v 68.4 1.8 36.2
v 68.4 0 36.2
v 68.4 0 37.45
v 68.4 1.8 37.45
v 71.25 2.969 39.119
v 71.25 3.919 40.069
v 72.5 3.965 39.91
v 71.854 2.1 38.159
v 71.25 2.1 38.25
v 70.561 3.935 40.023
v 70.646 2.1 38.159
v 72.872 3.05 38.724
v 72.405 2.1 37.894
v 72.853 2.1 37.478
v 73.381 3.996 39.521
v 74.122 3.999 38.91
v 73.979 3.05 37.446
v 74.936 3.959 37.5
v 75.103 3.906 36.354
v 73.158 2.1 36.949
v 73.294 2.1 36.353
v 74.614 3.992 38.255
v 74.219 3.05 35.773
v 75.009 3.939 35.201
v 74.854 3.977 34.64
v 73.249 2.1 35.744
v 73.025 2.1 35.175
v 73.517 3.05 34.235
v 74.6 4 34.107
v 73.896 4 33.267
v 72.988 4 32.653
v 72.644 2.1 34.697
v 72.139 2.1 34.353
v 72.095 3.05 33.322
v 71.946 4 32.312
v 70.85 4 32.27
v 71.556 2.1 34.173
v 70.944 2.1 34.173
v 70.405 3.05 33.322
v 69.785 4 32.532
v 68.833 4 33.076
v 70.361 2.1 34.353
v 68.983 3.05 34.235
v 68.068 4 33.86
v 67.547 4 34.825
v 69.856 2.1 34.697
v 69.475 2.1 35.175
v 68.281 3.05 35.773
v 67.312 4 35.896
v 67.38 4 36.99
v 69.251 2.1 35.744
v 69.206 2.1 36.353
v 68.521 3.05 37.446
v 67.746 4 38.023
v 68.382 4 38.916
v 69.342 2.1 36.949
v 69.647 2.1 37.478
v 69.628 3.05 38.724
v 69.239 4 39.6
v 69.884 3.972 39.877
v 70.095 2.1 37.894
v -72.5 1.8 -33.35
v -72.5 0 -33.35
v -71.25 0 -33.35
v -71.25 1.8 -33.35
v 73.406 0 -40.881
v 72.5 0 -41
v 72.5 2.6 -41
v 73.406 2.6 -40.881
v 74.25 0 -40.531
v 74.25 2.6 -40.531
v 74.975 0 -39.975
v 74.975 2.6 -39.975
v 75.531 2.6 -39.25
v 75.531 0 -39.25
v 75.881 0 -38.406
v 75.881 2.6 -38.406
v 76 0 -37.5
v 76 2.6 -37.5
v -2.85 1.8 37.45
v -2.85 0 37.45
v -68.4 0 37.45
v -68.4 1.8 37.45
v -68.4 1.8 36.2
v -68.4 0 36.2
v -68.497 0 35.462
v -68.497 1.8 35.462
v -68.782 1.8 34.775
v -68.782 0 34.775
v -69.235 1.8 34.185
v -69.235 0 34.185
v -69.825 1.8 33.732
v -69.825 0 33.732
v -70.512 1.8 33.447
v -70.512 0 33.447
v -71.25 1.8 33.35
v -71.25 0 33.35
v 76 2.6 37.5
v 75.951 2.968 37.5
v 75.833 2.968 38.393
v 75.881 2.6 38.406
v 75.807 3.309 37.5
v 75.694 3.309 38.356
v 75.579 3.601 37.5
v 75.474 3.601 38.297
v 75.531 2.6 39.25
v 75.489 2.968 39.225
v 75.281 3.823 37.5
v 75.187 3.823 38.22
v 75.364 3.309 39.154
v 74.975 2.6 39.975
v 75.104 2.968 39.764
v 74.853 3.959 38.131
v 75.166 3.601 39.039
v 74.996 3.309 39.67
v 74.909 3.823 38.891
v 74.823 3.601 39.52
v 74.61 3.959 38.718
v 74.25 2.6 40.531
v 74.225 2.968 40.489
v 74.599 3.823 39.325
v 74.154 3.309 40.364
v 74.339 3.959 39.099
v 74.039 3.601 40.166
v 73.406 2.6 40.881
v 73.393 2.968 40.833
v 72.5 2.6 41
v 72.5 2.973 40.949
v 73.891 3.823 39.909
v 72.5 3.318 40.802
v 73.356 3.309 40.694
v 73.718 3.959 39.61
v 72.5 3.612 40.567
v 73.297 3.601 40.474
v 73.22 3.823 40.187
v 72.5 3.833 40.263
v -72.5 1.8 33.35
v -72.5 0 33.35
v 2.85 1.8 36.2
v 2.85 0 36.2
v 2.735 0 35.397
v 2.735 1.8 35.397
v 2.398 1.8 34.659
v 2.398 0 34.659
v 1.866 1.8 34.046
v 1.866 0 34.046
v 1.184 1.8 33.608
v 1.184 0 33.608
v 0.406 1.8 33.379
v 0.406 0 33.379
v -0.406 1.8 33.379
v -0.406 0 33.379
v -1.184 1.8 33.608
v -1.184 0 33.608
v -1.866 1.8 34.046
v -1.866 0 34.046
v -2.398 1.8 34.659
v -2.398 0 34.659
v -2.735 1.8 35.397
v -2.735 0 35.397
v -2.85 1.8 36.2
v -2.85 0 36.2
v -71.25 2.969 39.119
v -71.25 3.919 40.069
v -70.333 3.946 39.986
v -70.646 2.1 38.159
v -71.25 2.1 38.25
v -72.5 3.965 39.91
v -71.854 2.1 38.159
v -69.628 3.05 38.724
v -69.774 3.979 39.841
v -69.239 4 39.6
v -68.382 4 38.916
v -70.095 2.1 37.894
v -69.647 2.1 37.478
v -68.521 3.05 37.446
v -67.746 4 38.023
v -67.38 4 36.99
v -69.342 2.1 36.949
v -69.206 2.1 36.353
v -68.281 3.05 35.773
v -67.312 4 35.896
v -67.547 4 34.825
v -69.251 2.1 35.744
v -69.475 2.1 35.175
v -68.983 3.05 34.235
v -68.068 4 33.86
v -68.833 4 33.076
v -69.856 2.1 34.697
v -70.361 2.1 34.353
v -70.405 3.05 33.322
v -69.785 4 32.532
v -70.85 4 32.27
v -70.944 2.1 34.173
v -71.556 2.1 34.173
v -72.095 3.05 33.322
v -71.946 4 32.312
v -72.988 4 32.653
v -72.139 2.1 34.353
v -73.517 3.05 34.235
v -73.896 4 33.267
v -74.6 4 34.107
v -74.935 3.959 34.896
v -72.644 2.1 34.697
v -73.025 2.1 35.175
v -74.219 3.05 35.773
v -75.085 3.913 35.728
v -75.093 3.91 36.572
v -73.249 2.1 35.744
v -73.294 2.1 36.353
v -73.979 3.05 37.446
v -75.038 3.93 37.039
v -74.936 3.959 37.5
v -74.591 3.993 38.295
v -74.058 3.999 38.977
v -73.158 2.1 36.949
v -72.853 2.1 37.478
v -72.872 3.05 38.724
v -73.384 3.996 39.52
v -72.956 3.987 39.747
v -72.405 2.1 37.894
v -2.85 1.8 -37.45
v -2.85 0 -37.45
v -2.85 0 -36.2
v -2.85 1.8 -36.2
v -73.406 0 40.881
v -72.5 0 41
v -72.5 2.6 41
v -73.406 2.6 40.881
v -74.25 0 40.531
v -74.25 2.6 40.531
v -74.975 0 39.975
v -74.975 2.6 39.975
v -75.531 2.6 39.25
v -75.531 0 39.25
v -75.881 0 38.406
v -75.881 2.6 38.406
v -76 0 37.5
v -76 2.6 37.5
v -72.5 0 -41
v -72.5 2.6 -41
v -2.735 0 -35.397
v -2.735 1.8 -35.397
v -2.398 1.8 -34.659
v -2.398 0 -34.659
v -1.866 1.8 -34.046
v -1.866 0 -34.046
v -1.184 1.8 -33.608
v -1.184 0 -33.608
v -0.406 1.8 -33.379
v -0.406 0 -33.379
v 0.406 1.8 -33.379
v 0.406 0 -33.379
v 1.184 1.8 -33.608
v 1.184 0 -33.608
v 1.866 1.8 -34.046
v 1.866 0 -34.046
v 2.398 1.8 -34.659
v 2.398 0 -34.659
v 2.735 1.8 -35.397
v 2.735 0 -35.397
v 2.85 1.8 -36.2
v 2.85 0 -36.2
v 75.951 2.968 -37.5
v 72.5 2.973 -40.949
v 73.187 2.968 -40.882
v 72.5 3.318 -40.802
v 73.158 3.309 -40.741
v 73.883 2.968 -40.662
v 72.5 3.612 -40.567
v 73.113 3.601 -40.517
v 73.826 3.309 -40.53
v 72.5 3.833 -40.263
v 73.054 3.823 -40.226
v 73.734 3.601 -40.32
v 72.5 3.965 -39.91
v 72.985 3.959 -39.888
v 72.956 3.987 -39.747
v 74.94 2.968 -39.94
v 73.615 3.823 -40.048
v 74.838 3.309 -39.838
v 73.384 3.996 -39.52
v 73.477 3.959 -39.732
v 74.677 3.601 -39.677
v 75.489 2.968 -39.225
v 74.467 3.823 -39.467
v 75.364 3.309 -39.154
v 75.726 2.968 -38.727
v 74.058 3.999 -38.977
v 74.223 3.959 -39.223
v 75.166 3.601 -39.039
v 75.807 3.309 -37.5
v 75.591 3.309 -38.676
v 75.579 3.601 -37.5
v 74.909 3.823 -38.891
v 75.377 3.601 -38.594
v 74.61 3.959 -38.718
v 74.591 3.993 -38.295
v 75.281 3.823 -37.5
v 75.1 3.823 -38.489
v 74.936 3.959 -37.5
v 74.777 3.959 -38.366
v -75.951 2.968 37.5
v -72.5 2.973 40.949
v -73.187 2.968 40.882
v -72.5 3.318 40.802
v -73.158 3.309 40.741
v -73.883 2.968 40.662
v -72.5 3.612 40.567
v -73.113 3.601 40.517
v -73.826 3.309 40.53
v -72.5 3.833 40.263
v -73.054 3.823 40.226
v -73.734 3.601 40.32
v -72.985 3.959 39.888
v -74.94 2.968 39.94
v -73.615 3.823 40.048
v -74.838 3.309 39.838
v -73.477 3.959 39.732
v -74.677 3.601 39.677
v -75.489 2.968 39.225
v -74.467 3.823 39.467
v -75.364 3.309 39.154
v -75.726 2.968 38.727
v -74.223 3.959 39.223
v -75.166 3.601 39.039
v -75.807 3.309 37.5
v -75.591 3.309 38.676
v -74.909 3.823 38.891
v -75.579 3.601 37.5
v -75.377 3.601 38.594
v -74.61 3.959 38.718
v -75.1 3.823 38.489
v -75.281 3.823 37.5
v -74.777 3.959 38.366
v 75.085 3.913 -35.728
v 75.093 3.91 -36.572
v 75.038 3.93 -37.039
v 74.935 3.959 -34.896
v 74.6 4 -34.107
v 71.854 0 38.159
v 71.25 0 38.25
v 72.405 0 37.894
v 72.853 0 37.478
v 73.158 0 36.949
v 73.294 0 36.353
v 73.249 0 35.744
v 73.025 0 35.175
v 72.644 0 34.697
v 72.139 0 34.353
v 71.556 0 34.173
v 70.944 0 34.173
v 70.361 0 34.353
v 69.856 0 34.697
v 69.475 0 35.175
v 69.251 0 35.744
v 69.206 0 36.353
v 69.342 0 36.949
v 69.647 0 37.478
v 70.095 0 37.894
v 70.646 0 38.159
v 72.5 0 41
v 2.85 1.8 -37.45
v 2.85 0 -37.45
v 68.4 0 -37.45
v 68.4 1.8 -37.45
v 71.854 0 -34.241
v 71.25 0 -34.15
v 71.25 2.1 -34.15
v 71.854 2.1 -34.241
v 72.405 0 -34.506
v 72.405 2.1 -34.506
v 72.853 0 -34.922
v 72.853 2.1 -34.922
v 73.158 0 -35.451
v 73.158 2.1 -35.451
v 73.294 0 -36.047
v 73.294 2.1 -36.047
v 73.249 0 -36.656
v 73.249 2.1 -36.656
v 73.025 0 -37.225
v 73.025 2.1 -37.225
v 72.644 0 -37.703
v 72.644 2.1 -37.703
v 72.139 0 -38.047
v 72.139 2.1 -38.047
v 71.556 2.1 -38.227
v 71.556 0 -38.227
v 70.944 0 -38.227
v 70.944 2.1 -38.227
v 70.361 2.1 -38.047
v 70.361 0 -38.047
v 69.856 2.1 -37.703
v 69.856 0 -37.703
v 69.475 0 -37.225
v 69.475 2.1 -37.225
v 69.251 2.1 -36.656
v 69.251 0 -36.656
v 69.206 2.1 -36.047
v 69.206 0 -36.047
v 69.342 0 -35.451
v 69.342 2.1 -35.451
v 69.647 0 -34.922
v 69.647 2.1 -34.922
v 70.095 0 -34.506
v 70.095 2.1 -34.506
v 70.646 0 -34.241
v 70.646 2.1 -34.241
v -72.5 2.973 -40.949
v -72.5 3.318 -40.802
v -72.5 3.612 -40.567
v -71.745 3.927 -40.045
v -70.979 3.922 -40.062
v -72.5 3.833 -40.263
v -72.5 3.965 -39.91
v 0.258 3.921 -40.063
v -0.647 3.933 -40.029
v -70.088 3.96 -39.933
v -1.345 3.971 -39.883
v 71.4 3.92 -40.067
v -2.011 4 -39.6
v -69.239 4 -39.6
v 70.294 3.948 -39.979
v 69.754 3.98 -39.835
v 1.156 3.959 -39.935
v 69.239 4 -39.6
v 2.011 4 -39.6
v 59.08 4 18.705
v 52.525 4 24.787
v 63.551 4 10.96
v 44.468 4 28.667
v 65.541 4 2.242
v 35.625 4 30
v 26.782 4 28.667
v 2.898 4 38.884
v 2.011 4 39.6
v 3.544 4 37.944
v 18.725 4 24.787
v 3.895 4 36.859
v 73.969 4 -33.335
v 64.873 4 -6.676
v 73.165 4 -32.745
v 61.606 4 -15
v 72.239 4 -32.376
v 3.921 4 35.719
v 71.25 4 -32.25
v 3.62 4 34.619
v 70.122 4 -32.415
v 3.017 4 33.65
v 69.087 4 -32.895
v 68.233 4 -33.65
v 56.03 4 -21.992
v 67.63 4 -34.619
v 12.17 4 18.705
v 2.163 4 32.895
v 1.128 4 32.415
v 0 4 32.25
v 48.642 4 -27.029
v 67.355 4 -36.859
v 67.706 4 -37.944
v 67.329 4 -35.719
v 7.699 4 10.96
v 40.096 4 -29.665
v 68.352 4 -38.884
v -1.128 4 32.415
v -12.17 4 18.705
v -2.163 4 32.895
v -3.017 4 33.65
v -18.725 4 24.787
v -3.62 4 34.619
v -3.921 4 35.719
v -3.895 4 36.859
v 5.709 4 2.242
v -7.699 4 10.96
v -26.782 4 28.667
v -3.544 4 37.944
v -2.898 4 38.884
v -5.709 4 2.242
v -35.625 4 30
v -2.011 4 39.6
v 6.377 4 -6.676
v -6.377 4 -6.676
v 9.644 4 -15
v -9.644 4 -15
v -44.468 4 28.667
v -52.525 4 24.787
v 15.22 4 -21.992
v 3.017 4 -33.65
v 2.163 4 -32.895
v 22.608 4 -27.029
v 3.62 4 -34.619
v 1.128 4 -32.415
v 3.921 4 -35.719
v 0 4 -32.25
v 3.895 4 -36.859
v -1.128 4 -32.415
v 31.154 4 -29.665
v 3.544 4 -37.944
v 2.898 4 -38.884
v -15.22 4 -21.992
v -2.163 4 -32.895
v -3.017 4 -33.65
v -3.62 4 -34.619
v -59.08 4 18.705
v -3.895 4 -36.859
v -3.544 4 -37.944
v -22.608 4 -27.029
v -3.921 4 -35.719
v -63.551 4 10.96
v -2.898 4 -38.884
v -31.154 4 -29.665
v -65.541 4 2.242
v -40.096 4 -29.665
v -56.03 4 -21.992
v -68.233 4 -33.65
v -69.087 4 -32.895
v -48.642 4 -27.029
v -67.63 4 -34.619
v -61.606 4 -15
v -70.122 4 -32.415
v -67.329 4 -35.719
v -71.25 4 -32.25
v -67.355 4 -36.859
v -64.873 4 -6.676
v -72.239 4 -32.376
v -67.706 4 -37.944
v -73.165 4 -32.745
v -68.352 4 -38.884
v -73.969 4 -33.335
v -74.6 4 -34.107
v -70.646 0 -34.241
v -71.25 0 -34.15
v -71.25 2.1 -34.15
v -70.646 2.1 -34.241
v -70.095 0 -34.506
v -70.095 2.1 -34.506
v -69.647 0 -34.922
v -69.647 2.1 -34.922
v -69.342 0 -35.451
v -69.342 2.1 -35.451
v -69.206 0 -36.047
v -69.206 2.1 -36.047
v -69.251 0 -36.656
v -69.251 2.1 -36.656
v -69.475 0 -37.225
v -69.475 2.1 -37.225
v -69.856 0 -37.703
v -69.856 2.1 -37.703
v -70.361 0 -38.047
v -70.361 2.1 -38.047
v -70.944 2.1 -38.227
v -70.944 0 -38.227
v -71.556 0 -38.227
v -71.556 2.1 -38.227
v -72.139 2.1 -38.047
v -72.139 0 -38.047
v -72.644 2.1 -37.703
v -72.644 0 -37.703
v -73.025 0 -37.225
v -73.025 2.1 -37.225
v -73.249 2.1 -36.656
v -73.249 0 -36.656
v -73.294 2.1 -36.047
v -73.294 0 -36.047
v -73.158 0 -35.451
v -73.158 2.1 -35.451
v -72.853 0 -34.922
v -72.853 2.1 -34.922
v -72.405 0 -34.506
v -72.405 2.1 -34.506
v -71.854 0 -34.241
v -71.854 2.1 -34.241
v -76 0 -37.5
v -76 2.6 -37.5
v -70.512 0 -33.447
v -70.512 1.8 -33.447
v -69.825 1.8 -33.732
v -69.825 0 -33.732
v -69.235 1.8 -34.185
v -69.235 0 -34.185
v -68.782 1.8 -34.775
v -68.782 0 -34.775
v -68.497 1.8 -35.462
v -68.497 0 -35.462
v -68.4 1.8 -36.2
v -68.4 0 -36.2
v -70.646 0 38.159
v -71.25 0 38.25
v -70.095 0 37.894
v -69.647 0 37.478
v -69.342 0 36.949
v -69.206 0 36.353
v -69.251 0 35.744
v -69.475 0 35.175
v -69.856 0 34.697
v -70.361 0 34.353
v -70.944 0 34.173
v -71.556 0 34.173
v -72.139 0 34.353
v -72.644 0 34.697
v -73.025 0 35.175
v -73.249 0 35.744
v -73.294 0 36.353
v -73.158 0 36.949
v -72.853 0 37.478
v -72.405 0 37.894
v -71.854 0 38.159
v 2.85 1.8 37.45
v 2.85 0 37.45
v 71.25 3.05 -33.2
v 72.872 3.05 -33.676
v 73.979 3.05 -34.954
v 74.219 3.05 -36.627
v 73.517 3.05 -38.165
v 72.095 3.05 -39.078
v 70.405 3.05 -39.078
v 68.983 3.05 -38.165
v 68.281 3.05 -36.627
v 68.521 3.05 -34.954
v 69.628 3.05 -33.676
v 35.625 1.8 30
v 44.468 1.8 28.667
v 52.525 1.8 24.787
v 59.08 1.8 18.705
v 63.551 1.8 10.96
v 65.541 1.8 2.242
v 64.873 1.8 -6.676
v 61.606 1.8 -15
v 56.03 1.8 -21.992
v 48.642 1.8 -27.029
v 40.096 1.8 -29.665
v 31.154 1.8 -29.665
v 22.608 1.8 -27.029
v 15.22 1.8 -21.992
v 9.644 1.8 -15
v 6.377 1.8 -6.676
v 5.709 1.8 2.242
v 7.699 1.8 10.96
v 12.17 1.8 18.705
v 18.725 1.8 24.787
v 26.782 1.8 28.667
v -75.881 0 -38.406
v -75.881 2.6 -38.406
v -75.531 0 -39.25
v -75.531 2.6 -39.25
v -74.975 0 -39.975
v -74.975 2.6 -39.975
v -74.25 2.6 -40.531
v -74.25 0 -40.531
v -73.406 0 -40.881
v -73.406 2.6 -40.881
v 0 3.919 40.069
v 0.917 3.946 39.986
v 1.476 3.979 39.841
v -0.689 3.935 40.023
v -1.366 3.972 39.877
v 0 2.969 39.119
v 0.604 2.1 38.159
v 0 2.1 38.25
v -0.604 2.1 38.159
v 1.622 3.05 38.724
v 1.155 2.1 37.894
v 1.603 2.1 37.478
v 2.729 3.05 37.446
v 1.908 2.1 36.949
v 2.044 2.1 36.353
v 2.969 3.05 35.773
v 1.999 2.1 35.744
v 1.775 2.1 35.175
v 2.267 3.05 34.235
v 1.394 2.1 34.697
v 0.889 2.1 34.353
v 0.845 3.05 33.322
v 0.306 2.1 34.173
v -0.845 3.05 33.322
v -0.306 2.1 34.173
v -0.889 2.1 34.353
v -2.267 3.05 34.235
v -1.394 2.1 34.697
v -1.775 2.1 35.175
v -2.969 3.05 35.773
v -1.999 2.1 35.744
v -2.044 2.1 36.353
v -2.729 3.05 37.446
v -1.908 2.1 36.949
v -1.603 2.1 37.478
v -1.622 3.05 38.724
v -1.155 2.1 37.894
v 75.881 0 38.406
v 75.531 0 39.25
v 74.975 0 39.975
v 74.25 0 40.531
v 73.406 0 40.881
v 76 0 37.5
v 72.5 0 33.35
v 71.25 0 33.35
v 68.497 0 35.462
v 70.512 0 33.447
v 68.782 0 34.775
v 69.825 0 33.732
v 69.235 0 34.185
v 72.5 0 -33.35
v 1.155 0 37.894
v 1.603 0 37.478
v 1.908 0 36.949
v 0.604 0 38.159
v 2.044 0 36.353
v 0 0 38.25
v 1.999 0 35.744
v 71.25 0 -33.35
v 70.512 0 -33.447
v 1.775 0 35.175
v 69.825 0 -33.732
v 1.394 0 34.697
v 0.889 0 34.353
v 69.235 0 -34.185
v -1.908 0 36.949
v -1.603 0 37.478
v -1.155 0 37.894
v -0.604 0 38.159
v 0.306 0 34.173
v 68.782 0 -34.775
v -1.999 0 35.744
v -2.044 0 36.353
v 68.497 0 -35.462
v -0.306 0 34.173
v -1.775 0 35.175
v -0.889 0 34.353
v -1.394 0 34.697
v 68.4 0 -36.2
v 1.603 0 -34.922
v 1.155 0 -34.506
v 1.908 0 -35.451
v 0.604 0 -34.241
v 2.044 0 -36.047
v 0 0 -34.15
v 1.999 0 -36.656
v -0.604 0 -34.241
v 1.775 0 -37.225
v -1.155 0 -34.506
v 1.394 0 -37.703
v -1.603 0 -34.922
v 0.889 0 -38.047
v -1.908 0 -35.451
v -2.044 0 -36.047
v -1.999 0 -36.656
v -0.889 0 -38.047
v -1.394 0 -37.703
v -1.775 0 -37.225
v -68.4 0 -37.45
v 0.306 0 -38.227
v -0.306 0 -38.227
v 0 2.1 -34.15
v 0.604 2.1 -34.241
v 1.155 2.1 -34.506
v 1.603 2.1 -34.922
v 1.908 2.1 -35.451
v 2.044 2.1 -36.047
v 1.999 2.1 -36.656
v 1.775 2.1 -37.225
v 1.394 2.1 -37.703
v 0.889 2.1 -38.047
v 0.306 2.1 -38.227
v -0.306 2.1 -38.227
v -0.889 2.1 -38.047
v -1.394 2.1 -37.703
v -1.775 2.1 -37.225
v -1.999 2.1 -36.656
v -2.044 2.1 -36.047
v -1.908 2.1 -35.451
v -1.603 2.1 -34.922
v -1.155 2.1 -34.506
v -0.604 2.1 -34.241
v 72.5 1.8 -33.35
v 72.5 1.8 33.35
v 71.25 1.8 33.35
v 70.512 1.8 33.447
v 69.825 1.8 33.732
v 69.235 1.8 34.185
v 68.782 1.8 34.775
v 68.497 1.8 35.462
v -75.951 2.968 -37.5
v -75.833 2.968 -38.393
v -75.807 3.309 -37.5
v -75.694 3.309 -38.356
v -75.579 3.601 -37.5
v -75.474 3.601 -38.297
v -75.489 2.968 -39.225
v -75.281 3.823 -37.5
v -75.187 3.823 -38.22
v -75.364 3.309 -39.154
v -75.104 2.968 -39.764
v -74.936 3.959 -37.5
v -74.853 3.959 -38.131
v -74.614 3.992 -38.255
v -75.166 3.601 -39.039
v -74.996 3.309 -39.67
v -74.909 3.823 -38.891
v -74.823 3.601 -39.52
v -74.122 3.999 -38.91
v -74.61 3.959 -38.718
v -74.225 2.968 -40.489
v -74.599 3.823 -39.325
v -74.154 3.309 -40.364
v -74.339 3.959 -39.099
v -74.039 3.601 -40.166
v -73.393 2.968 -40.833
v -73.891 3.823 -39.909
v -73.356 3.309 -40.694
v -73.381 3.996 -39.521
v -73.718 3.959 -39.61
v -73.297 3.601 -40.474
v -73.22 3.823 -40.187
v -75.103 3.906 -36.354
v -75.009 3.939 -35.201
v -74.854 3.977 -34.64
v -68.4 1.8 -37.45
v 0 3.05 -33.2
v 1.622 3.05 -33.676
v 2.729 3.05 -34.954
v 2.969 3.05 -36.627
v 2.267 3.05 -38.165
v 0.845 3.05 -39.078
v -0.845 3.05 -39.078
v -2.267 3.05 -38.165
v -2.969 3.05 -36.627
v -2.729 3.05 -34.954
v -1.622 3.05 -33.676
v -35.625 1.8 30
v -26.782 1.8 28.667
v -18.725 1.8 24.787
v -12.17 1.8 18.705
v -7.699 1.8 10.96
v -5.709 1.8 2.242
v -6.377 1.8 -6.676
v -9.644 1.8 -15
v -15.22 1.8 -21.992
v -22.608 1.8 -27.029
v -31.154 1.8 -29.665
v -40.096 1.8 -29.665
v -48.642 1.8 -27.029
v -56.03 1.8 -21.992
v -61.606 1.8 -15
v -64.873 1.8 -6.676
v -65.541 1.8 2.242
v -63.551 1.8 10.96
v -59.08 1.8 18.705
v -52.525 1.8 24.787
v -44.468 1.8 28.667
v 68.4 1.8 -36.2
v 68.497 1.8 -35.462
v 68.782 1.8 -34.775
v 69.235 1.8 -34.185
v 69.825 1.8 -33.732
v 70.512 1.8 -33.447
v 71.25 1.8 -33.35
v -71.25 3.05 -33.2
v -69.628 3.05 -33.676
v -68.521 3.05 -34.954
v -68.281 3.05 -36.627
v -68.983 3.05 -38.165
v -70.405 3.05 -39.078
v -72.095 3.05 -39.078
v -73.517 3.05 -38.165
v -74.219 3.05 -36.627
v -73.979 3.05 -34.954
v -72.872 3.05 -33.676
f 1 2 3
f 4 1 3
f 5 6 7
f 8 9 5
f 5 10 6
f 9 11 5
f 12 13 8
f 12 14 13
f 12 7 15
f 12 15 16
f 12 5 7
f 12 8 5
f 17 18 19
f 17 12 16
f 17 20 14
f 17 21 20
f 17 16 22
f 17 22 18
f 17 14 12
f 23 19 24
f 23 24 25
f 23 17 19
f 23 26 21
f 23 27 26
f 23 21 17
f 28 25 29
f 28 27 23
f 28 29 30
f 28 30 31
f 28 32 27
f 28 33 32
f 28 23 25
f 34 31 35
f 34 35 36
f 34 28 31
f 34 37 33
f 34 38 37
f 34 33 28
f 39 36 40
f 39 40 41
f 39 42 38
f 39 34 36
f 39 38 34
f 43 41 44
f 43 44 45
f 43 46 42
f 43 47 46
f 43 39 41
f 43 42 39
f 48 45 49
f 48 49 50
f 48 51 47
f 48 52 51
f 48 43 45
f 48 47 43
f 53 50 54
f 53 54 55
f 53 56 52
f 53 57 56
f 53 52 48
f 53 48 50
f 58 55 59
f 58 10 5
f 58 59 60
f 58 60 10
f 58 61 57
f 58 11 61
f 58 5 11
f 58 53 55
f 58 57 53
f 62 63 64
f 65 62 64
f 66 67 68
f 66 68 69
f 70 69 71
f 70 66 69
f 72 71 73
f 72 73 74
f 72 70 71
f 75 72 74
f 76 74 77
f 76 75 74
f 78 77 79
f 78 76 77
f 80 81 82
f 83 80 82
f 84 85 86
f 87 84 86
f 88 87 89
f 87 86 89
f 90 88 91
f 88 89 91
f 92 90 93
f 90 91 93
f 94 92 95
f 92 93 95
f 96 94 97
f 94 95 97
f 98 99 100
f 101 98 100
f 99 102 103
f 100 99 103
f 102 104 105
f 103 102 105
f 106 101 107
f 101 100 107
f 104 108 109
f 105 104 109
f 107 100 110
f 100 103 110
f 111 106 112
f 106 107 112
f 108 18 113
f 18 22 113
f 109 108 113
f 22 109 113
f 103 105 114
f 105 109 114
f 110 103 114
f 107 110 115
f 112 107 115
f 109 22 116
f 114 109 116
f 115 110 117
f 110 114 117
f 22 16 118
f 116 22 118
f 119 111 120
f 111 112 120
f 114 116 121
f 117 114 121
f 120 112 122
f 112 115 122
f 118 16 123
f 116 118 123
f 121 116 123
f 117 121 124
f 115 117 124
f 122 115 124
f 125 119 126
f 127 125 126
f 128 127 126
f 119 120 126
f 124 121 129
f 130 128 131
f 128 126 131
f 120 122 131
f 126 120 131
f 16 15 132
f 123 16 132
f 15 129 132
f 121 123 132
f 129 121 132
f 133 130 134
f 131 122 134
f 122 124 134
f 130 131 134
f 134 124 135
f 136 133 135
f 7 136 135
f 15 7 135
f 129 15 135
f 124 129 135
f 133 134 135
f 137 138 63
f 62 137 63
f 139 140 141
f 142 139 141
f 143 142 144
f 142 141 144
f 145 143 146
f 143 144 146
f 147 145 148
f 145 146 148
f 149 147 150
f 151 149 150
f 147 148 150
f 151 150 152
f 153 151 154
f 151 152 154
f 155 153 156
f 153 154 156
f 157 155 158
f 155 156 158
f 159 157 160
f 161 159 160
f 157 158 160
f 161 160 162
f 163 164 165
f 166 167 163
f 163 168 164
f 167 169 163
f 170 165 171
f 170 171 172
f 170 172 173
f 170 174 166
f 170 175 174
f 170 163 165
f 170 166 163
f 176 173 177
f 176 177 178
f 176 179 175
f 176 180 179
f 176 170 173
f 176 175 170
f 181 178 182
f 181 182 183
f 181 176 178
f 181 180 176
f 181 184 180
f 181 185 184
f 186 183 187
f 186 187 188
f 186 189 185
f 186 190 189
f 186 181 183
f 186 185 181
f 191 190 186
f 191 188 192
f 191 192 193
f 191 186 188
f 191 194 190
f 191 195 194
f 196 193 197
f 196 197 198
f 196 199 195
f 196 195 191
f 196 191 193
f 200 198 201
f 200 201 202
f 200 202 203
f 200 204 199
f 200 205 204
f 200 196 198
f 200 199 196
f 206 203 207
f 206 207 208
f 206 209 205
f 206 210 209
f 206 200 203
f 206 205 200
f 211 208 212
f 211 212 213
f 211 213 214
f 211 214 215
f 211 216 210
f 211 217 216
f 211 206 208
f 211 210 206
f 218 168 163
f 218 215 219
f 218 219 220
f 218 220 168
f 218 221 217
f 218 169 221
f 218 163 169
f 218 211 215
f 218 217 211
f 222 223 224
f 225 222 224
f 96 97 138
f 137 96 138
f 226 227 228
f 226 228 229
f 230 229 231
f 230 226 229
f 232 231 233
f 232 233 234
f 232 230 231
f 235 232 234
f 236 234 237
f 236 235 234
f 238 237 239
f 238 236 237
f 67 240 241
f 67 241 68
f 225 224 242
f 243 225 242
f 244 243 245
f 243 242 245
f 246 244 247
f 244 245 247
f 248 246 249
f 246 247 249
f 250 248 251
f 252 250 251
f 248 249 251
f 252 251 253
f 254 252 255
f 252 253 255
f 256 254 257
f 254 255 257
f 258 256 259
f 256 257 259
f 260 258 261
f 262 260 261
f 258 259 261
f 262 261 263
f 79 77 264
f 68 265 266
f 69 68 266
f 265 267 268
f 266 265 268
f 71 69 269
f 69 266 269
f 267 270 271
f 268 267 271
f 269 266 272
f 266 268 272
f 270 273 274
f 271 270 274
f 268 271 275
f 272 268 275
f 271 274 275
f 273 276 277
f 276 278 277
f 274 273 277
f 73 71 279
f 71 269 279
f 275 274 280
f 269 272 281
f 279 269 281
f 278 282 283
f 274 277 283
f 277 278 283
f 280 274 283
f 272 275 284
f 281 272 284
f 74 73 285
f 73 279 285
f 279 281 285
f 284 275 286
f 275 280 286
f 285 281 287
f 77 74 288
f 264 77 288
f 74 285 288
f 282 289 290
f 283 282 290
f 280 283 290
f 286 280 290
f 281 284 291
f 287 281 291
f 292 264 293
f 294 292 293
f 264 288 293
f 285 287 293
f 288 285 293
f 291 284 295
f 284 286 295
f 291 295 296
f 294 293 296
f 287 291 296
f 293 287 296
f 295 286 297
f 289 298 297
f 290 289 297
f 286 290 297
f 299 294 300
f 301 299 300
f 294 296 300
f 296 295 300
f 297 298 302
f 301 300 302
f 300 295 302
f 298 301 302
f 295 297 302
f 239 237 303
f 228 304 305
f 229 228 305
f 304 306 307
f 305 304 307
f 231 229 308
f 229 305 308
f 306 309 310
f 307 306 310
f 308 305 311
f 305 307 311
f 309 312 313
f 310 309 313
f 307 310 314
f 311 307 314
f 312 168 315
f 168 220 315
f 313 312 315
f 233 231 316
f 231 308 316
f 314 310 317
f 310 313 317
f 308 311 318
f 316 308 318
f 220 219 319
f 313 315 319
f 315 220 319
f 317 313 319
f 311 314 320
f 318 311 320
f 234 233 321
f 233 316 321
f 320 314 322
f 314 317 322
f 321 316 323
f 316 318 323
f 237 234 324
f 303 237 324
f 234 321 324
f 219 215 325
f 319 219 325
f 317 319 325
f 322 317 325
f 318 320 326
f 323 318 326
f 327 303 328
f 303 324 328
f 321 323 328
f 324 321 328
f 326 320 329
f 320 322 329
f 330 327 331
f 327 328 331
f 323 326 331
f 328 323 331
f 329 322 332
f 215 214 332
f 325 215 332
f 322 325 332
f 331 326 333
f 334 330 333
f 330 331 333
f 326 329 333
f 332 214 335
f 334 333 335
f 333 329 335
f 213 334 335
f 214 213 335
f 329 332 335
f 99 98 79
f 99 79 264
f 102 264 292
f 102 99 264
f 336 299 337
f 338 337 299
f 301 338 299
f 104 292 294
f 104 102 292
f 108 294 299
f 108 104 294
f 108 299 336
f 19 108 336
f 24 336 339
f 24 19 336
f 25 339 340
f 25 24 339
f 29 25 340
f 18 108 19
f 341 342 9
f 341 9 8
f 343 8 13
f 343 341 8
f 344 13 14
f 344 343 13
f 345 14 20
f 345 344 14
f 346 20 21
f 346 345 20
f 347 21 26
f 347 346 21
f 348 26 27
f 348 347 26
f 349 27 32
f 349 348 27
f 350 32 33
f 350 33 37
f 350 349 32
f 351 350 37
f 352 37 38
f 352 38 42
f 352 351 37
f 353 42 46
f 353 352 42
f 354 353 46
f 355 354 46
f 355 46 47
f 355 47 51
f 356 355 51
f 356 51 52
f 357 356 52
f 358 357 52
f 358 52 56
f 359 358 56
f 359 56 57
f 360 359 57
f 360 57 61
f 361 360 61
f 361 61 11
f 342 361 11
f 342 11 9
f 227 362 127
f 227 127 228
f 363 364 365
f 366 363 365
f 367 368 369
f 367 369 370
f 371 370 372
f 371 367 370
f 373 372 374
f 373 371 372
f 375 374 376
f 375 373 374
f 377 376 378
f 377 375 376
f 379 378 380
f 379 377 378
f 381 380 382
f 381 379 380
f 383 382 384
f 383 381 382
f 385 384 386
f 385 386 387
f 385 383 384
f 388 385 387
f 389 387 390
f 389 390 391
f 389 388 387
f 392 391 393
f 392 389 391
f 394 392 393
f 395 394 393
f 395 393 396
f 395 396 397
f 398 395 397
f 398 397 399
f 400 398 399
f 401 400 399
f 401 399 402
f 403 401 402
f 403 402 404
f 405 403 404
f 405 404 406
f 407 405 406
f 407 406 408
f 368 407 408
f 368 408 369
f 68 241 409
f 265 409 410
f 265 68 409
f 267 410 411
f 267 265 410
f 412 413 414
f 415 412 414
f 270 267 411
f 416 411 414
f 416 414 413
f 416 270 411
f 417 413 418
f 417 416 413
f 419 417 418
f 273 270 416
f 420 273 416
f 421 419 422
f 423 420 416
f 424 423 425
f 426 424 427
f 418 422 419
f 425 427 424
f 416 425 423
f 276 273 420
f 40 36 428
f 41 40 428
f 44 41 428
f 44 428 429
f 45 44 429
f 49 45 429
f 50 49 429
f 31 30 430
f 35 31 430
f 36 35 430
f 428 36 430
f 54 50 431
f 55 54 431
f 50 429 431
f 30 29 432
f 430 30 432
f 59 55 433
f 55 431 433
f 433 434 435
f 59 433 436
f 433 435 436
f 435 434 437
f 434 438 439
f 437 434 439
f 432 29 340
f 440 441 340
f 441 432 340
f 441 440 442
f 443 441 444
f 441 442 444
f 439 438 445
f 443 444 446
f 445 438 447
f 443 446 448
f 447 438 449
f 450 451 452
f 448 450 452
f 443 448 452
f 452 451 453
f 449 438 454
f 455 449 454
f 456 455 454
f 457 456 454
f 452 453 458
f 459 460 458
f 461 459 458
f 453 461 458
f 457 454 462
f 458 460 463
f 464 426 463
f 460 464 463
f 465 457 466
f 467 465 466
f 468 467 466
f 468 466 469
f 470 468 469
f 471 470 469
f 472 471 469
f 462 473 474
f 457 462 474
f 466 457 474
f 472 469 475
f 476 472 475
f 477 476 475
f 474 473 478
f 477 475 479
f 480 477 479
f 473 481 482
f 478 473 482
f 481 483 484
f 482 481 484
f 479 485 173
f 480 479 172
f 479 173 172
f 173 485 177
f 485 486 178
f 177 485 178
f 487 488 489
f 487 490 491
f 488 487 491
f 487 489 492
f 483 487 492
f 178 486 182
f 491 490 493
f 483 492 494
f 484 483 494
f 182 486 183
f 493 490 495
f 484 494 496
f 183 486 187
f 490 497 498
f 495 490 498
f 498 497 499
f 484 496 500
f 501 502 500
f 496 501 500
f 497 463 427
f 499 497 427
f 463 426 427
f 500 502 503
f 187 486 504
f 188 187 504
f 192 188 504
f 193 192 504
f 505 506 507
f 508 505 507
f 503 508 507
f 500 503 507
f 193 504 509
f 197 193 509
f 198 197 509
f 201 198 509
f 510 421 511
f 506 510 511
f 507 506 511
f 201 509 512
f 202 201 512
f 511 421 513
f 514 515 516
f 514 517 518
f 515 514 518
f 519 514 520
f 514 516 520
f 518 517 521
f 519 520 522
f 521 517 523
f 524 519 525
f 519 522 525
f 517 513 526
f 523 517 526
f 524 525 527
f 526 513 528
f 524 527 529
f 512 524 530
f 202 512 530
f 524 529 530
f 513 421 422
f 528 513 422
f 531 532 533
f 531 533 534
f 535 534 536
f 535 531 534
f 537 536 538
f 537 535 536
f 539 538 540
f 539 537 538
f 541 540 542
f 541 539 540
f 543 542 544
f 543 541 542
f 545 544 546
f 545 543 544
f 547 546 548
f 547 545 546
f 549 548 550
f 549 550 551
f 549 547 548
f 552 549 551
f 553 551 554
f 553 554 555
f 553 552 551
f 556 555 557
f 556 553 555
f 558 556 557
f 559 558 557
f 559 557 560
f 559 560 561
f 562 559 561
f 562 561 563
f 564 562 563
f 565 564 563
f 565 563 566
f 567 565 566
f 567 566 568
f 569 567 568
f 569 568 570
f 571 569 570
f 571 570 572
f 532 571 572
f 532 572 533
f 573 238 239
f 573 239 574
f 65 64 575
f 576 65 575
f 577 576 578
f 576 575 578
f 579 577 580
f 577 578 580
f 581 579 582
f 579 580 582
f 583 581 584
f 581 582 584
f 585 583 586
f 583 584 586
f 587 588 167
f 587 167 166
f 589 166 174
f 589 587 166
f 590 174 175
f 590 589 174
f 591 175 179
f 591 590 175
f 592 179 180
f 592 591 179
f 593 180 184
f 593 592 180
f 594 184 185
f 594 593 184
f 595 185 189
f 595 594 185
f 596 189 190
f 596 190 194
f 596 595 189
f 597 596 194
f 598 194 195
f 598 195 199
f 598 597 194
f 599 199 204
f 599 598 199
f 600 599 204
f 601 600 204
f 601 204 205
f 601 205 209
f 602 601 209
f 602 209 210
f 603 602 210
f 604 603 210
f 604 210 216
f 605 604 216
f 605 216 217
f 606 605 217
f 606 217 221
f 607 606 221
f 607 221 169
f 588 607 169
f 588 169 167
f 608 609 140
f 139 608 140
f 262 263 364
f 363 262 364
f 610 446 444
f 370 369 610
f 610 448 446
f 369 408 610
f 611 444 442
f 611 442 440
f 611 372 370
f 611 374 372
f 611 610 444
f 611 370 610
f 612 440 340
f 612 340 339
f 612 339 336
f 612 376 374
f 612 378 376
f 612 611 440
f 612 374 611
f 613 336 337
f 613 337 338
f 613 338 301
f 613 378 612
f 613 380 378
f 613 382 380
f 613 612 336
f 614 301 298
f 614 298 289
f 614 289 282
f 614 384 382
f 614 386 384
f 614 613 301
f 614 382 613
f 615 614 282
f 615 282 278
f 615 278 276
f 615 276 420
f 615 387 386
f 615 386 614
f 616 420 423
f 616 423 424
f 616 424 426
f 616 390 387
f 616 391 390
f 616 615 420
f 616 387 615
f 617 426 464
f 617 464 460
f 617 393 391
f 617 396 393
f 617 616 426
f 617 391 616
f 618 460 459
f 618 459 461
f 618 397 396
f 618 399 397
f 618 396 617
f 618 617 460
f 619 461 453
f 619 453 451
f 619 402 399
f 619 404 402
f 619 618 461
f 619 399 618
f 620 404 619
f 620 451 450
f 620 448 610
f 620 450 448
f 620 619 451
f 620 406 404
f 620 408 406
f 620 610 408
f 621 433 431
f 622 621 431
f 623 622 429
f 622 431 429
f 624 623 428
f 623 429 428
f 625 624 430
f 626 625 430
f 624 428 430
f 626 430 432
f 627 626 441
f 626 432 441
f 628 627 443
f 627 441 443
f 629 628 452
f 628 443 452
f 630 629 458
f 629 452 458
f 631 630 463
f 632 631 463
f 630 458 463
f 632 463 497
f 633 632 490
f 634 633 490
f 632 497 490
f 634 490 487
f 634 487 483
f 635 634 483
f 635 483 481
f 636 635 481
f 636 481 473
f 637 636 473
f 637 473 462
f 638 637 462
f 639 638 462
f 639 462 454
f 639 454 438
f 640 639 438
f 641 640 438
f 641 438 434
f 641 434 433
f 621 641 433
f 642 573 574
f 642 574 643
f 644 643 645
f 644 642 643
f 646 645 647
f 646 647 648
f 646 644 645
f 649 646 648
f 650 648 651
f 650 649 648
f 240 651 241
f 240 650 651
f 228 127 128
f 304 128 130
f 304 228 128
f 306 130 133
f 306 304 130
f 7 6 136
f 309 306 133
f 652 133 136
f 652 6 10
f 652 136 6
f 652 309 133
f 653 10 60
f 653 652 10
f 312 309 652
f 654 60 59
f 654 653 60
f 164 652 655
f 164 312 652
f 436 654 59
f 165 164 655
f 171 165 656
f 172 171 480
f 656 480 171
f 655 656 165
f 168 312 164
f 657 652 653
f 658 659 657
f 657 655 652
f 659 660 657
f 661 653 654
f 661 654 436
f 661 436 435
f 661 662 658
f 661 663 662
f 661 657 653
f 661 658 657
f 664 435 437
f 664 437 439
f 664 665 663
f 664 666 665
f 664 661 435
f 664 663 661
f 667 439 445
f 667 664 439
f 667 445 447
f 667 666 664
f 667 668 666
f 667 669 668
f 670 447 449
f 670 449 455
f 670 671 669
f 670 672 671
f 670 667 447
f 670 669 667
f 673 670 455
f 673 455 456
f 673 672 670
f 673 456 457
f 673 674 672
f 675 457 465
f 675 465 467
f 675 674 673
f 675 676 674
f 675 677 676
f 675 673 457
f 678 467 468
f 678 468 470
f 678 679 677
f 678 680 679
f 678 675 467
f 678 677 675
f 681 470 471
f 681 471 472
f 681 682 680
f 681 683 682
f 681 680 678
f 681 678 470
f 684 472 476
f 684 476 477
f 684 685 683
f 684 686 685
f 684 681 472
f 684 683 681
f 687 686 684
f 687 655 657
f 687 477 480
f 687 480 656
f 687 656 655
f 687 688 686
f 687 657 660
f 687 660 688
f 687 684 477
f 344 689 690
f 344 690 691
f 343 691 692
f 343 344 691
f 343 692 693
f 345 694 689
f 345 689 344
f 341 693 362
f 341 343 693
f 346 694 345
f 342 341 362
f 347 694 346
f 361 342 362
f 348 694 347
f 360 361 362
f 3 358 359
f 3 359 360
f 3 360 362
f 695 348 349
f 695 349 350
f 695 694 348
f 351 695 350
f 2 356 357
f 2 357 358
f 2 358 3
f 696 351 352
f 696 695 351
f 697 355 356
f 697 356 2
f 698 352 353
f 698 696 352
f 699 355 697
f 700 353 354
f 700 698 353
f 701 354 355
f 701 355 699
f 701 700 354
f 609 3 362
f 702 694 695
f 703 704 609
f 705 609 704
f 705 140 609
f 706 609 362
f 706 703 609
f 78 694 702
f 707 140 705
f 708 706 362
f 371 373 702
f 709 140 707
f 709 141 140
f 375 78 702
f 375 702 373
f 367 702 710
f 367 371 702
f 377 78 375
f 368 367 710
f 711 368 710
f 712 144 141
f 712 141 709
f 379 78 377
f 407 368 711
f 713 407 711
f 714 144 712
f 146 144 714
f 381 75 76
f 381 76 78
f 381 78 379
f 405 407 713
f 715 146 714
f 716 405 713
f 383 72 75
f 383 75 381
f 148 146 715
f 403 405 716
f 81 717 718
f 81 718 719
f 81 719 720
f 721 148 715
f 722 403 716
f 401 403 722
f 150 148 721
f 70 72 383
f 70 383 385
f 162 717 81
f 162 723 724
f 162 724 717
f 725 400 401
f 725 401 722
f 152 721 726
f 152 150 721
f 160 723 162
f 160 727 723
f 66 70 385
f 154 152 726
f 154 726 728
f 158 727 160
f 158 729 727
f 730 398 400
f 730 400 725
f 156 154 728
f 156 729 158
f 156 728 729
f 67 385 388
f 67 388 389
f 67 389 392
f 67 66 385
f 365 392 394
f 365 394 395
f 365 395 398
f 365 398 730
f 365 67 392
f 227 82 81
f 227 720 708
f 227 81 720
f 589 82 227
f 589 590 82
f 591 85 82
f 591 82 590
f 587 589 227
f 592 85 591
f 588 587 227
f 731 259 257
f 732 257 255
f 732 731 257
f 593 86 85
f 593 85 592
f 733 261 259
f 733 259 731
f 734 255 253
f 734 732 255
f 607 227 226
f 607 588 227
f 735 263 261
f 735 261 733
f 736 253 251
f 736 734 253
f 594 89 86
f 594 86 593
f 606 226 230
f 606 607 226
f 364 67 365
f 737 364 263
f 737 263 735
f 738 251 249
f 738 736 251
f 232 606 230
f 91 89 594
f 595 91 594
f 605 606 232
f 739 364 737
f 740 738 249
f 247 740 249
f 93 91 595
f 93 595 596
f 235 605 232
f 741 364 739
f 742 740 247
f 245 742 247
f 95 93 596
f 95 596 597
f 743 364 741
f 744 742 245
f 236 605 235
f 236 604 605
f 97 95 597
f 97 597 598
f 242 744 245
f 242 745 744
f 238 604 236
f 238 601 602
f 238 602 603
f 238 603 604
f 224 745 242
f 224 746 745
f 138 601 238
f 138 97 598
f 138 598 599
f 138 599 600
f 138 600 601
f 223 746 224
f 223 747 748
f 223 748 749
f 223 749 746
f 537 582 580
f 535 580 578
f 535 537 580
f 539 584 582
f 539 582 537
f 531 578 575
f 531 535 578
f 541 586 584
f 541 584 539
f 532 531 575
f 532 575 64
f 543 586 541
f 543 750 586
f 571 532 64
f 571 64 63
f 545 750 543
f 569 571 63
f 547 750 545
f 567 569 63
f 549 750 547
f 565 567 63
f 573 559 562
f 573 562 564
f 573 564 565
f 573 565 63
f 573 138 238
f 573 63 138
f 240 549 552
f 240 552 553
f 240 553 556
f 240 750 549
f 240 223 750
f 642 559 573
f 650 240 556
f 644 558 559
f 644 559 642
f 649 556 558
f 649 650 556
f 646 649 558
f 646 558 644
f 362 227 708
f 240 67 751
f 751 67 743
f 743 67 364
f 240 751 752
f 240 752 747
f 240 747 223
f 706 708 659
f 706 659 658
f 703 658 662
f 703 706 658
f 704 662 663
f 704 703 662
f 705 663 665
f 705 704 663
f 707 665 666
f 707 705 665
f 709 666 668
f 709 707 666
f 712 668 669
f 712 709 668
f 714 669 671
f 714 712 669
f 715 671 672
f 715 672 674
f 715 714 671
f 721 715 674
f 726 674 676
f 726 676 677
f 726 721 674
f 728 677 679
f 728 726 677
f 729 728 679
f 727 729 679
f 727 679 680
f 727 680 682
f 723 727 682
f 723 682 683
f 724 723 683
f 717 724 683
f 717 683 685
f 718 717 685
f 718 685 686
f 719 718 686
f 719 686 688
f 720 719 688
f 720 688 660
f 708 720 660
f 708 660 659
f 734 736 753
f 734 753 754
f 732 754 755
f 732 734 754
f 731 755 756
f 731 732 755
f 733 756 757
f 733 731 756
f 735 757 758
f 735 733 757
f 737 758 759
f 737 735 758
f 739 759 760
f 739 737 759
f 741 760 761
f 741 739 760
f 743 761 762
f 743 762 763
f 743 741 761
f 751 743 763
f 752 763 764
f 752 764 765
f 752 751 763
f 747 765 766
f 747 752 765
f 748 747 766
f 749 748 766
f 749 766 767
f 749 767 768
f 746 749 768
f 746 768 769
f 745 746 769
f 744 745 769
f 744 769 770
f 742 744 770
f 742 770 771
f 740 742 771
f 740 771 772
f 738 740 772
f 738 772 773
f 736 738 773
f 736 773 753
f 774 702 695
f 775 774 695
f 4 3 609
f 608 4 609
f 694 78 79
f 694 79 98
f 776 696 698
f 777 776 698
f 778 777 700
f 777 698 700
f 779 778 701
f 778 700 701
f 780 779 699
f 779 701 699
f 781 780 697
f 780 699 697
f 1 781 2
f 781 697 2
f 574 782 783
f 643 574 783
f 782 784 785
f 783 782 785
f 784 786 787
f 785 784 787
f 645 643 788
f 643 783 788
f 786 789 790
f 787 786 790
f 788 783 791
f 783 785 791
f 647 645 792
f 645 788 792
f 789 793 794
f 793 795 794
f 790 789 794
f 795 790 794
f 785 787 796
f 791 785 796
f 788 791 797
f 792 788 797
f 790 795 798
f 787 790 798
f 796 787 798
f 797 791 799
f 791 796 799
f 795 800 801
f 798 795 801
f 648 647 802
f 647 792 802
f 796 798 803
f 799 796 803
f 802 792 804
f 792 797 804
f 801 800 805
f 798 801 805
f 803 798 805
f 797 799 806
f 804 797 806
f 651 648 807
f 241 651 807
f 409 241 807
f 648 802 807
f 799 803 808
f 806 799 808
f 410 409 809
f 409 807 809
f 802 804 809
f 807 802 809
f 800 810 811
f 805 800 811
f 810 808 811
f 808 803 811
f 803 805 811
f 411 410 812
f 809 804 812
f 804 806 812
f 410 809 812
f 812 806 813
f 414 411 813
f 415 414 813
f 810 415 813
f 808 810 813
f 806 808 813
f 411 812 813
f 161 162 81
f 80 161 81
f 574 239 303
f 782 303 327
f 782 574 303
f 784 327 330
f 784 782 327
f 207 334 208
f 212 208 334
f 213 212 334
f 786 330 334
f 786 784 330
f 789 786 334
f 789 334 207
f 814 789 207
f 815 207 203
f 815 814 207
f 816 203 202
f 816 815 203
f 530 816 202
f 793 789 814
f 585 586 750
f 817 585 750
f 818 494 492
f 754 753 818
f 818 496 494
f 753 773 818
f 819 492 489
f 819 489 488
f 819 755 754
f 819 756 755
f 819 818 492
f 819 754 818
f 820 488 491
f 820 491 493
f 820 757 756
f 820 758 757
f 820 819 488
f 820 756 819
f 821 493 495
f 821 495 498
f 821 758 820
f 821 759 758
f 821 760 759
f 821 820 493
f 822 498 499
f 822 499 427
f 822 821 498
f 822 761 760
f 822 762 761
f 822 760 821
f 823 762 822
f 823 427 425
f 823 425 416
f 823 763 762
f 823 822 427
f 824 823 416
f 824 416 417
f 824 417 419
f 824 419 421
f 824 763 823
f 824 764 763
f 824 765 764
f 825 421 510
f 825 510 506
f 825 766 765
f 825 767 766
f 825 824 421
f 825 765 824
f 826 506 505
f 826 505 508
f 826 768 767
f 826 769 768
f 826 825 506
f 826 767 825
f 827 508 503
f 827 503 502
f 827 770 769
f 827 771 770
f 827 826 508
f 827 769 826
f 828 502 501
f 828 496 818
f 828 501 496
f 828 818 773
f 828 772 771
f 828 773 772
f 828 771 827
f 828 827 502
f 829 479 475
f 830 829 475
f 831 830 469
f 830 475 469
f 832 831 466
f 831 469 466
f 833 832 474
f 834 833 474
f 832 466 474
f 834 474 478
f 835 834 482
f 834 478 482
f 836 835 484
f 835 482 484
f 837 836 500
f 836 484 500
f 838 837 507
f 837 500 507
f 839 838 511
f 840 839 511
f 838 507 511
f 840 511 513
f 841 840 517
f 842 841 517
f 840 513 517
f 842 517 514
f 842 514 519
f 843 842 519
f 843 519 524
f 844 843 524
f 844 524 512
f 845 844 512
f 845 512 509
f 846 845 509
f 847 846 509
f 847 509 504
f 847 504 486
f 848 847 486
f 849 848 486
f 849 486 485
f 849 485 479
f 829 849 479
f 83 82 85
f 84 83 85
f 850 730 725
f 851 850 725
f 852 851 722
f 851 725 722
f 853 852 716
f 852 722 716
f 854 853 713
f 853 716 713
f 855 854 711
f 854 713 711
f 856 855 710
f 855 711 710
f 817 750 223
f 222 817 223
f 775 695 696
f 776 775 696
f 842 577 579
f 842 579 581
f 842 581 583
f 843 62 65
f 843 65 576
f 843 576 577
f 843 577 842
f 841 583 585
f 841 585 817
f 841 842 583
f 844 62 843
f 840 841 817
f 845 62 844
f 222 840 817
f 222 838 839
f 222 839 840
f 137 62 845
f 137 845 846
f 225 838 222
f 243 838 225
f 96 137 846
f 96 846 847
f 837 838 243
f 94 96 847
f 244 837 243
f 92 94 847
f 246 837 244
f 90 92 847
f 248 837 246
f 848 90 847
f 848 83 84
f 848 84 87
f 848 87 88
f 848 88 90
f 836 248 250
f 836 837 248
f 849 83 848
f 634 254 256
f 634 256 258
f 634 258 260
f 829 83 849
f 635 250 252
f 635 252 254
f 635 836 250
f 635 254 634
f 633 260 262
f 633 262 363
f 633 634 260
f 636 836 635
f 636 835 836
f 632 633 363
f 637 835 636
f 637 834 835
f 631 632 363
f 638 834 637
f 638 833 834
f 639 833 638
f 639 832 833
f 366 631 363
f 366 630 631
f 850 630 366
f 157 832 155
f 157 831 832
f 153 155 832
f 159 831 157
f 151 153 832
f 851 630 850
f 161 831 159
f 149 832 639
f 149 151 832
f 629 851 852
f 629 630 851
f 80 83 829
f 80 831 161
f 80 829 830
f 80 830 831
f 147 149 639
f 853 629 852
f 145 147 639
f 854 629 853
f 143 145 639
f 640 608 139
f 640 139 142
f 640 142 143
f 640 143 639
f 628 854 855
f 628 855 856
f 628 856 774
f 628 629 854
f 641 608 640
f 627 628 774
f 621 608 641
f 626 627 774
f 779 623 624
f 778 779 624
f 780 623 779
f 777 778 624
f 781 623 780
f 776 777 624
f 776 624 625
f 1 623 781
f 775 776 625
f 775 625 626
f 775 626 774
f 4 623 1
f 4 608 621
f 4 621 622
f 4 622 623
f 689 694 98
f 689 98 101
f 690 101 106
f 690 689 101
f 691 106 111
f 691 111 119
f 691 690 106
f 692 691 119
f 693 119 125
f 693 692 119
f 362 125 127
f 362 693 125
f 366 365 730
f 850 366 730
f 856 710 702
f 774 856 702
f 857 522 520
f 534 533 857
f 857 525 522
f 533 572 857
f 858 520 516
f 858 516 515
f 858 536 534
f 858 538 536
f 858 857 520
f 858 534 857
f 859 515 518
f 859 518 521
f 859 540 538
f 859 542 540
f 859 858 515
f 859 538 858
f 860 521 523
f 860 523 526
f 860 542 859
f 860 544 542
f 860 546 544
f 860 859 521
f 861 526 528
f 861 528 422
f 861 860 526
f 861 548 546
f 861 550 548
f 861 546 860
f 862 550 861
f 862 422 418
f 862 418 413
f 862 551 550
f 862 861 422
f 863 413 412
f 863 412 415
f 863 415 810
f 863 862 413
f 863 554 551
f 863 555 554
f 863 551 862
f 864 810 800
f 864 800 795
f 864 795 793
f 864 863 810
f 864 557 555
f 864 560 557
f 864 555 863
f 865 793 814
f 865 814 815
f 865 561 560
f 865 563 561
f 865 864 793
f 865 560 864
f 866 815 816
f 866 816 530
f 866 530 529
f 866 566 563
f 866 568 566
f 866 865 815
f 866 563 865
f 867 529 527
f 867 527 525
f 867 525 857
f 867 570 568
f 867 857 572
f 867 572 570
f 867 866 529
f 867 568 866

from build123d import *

# Parameters (mm, degrees)
SKETCH1_R           = 2.05
BOSS_EXTRUDE1_DEPTH = 4
FILLET1_R           = 1.4
CHAMFER1_SIZE       = 1.9
CUT_EXTRUDE1_DEPTH  = 1.8
SKETCH4_R           = 30
CUT_EXTRUDE2_DEPTH  = 87.446515392


with BuildPart() as part:
    # Sketch1 → Boss-Extrude1 (new body)
    with BuildSketch(Plane(origin=(0, 0, 0), x_dir=(1, 0, 0), z_dir=(0, 1, 0))):
        with BuildLine():
            Line((72.5, -41), (-72.5, -41))
            ThreePointArc((-72.5, -41), (-74.974873734, -39.974873734), (-76, -37.5))
            Line((-76, -37.5), (-76, 37.5))
            ThreePointArc((-76, 37.5), (-74.974873734, 39.974873734), (-72.5, 41))
            Line((-72.5, 41), (72.5, 41))
            ThreePointArc((72.5, 41), (74.974873734, 39.974873734), (76, 37.5))
            Line((76, 37.5), (76, -37.5))
            ThreePointArc((76, -37.5), (74.974873734, -39.974873734), (72.5, -41))
        make_face()
        with Locations(Location((-71.25, 36.2, 0), (0, 0, 270))):
            Circle(SKETCH1_R, mode=Mode.SUBTRACT)
        with Locations(Location((-71.25, -36.2, 0), (0, 0, 270))):
            Circle(SKETCH1_R, mode=Mode.SUBTRACT)
        with Locations(Location((71.25, -36.2, 0), (0, 0, 270))):
            Circle(SKETCH1_R, mode=Mode.SUBTRACT)
        with Locations(Location((71.25, 36.2, 0), (0, 0, 270))):
            Circle(SKETCH1_R, mode=Mode.SUBTRACT)
        with Locations(Location((0, 36.2, 0), (0, 0, 270))):
            Circle(SKETCH1_R, mode=Mode.SUBTRACT)
        with Locations(Location((0, -36.2, 0), (0, 0, 270))):
            Circle(SKETCH1_R, mode=Mode.SUBTRACT)
    extrude(amount=BOSS_EXTRUDE1_DEPTH)

    # Fillet1
    fillet1_edges = [part.edges().sort_by_distance(p)[0] for p in [
        (74.974873734, 4, 39.974873734),
        (76, 4, 0),
        (74.974873734, 4, -39.974873734),
        (0, 4, -41),
        (-74.974873734, 4, -39.974873734),
        (-76, 4, 0),
        (-74.974873734, 4, 39.974873734),
        (0, 4, 41),
    ]]
    fillet(fillet1_edges, radius=FILLET1_R)

    # Chamfer1
    # the kernel refuses this chamfer: 1.9 mm, written as the material it takes off along each edge
    with BuildSketch(Plane(origin=(71.25, 4, 36.2), x_dir=(0, 0, 1), z_dir=(-1, 0, 0))) as chamfer1_piece_1:
        Polygon((2.05 + CHAMFER1_SIZE, 0), (2.05, -CHAMFER1_SIZE), (2.05, 0), align=None)
    revolve(axis=Axis((71.25, 4, 36.2), (0, 1, 0)), mode=Mode.SUBTRACT)
    with BuildSketch(Plane(origin=(71.25, 4, -36.2), x_dir=(0, 0, 1), z_dir=(-1, 0, 0))) as chamfer1_piece_2:
        Polygon((2.05 + CHAMFER1_SIZE, 0), (2.05, -CHAMFER1_SIZE), (2.05, 0), align=None)
    revolve(axis=Axis((71.25, 4, -36.2), (0, 1, 0)), mode=Mode.SUBTRACT)
    with BuildSketch(Plane(origin=(-71.25, 4, 36.2), x_dir=(0, 0, 1), z_dir=(-1, 0, 0))) as chamfer1_piece_3:
        Polygon((2.05 + CHAMFER1_SIZE, 0), (2.05, -CHAMFER1_SIZE), (2.05, 0), align=None)
    revolve(axis=Axis((-71.25, 4, 36.2), (0, 1, 0)), mode=Mode.SUBTRACT)
    with BuildSketch(Plane(origin=(-71.25, 4, -36.2), x_dir=(0, 0, 1), z_dir=(-1, 0, 0))) as chamfer1_piece_4:
        Polygon((2.05 + CHAMFER1_SIZE, 0), (2.05, -CHAMFER1_SIZE), (2.05, 0), align=None)
    revolve(axis=Axis((-71.25, 4, -36.2), (0, 1, 0)), mode=Mode.SUBTRACT)
    with BuildSketch(Plane(origin=(0, 4, 36.2), x_dir=(0, 0, 1), z_dir=(-1, 0, 0))) as chamfer1_piece_5:
        Polygon((2.05 + CHAMFER1_SIZE, 0), (2.05, -CHAMFER1_SIZE), (2.05, 0), align=None)
    revolve(axis=Axis((0, 4, 36.2), (0, 1, 0)), mode=Mode.SUBTRACT)
    with BuildSketch(Plane(origin=(0, 4, -36.2), x_dir=(0, 0, 1), z_dir=(-1, 0, 0))) as chamfer1_piece_6:
        Polygon((2.05 + CHAMFER1_SIZE, 0), (2.05, -CHAMFER1_SIZE), (2.05, 0), align=None)
    revolve(axis=Axis((0, 4, -36.2), (0, 1, 0)), mode=Mode.SUBTRACT)

    # Sketch2 → Cut-Extrude1 (cut)
    with BuildSketch(Plane.XZ):
        with BuildLine():
            Line((-71.25, 33.35), (-72.5, 33.35))
            Line((-72.5, 33.35), (-72.5, -33.35))
            Line((-72.5, -33.35), (-71.25, -33.35))
            ThreePointArc((-71.25, -33.35), (-69.234745674, -34.184745674), (-68.4, -36.2))
            Line((-68.4, -36.2), (-68.4, -37.45))
            Line((-68.4, -37.45), (-2.85, -37.45))
            Line((-2.85, -37.45), (-2.85, -36.2))
            ThreePointArc((-2.85, -36.2), (0, -33.35), (2.85, -36.2))
            Line((2.85, -36.2), (2.85, -37.45))
            Line((2.85, -37.45), (68.4, -37.45))
            Line((68.4, -37.45), (68.4, -36.2))
            ThreePointArc((68.4, -36.2), (69.234745674, -34.184745674), (71.25, -33.35))
            Line((71.25, -33.35), (72.5, -33.35))
            Line((72.5, -33.35), (72.5, 33.35))
            Line((72.5, 33.35), (71.25, 33.35))
            ThreePointArc((71.25, 33.35), (69.234745674, 34.184745674), (68.4, 36.2))
            Line((68.4, 36.2), (68.4, 37.45))
            Line((68.4, 37.45), (2.85, 37.45))
            Line((2.85, 37.45), (2.85, 36.2))
            ThreePointArc((2.85, 36.2), (0, 33.35), (-2.85, 36.2))
            Line((-2.85, 36.2), (-2.85, 37.45))
            Line((-2.85, 37.45), (-68.4, 37.45))
            Line((-68.4, 37.45), (-68.4, 36.2))
            ThreePointArc((-68.4, 36.2), (-69.234745674, 34.184745674), (-71.25, 33.35))
        make_face()
    extrude(amount=-CUT_EXTRUDE1_DEPTH, mode=Mode.SUBTRACT)

    # Sketch4 → Cut-Extrude2 (cut, through all)
    with BuildSketch(Plane(origin=(0, 4, 0), x_dir=(1, 0, 0), z_dir=(0, 1, 0))):
        with Locations(Location((-35.625, 0, 0), (0, 0, 270))):
            Circle(SKETCH4_R)
        with Locations(Location((35.625, 0, 0), (0, 0, 270))):
            Circle(SKETCH4_R)
    extrude(amount=-CUT_EXTRUDE2_DEPTH, mode=Mode.SUBTRACT)


solid = part.part
